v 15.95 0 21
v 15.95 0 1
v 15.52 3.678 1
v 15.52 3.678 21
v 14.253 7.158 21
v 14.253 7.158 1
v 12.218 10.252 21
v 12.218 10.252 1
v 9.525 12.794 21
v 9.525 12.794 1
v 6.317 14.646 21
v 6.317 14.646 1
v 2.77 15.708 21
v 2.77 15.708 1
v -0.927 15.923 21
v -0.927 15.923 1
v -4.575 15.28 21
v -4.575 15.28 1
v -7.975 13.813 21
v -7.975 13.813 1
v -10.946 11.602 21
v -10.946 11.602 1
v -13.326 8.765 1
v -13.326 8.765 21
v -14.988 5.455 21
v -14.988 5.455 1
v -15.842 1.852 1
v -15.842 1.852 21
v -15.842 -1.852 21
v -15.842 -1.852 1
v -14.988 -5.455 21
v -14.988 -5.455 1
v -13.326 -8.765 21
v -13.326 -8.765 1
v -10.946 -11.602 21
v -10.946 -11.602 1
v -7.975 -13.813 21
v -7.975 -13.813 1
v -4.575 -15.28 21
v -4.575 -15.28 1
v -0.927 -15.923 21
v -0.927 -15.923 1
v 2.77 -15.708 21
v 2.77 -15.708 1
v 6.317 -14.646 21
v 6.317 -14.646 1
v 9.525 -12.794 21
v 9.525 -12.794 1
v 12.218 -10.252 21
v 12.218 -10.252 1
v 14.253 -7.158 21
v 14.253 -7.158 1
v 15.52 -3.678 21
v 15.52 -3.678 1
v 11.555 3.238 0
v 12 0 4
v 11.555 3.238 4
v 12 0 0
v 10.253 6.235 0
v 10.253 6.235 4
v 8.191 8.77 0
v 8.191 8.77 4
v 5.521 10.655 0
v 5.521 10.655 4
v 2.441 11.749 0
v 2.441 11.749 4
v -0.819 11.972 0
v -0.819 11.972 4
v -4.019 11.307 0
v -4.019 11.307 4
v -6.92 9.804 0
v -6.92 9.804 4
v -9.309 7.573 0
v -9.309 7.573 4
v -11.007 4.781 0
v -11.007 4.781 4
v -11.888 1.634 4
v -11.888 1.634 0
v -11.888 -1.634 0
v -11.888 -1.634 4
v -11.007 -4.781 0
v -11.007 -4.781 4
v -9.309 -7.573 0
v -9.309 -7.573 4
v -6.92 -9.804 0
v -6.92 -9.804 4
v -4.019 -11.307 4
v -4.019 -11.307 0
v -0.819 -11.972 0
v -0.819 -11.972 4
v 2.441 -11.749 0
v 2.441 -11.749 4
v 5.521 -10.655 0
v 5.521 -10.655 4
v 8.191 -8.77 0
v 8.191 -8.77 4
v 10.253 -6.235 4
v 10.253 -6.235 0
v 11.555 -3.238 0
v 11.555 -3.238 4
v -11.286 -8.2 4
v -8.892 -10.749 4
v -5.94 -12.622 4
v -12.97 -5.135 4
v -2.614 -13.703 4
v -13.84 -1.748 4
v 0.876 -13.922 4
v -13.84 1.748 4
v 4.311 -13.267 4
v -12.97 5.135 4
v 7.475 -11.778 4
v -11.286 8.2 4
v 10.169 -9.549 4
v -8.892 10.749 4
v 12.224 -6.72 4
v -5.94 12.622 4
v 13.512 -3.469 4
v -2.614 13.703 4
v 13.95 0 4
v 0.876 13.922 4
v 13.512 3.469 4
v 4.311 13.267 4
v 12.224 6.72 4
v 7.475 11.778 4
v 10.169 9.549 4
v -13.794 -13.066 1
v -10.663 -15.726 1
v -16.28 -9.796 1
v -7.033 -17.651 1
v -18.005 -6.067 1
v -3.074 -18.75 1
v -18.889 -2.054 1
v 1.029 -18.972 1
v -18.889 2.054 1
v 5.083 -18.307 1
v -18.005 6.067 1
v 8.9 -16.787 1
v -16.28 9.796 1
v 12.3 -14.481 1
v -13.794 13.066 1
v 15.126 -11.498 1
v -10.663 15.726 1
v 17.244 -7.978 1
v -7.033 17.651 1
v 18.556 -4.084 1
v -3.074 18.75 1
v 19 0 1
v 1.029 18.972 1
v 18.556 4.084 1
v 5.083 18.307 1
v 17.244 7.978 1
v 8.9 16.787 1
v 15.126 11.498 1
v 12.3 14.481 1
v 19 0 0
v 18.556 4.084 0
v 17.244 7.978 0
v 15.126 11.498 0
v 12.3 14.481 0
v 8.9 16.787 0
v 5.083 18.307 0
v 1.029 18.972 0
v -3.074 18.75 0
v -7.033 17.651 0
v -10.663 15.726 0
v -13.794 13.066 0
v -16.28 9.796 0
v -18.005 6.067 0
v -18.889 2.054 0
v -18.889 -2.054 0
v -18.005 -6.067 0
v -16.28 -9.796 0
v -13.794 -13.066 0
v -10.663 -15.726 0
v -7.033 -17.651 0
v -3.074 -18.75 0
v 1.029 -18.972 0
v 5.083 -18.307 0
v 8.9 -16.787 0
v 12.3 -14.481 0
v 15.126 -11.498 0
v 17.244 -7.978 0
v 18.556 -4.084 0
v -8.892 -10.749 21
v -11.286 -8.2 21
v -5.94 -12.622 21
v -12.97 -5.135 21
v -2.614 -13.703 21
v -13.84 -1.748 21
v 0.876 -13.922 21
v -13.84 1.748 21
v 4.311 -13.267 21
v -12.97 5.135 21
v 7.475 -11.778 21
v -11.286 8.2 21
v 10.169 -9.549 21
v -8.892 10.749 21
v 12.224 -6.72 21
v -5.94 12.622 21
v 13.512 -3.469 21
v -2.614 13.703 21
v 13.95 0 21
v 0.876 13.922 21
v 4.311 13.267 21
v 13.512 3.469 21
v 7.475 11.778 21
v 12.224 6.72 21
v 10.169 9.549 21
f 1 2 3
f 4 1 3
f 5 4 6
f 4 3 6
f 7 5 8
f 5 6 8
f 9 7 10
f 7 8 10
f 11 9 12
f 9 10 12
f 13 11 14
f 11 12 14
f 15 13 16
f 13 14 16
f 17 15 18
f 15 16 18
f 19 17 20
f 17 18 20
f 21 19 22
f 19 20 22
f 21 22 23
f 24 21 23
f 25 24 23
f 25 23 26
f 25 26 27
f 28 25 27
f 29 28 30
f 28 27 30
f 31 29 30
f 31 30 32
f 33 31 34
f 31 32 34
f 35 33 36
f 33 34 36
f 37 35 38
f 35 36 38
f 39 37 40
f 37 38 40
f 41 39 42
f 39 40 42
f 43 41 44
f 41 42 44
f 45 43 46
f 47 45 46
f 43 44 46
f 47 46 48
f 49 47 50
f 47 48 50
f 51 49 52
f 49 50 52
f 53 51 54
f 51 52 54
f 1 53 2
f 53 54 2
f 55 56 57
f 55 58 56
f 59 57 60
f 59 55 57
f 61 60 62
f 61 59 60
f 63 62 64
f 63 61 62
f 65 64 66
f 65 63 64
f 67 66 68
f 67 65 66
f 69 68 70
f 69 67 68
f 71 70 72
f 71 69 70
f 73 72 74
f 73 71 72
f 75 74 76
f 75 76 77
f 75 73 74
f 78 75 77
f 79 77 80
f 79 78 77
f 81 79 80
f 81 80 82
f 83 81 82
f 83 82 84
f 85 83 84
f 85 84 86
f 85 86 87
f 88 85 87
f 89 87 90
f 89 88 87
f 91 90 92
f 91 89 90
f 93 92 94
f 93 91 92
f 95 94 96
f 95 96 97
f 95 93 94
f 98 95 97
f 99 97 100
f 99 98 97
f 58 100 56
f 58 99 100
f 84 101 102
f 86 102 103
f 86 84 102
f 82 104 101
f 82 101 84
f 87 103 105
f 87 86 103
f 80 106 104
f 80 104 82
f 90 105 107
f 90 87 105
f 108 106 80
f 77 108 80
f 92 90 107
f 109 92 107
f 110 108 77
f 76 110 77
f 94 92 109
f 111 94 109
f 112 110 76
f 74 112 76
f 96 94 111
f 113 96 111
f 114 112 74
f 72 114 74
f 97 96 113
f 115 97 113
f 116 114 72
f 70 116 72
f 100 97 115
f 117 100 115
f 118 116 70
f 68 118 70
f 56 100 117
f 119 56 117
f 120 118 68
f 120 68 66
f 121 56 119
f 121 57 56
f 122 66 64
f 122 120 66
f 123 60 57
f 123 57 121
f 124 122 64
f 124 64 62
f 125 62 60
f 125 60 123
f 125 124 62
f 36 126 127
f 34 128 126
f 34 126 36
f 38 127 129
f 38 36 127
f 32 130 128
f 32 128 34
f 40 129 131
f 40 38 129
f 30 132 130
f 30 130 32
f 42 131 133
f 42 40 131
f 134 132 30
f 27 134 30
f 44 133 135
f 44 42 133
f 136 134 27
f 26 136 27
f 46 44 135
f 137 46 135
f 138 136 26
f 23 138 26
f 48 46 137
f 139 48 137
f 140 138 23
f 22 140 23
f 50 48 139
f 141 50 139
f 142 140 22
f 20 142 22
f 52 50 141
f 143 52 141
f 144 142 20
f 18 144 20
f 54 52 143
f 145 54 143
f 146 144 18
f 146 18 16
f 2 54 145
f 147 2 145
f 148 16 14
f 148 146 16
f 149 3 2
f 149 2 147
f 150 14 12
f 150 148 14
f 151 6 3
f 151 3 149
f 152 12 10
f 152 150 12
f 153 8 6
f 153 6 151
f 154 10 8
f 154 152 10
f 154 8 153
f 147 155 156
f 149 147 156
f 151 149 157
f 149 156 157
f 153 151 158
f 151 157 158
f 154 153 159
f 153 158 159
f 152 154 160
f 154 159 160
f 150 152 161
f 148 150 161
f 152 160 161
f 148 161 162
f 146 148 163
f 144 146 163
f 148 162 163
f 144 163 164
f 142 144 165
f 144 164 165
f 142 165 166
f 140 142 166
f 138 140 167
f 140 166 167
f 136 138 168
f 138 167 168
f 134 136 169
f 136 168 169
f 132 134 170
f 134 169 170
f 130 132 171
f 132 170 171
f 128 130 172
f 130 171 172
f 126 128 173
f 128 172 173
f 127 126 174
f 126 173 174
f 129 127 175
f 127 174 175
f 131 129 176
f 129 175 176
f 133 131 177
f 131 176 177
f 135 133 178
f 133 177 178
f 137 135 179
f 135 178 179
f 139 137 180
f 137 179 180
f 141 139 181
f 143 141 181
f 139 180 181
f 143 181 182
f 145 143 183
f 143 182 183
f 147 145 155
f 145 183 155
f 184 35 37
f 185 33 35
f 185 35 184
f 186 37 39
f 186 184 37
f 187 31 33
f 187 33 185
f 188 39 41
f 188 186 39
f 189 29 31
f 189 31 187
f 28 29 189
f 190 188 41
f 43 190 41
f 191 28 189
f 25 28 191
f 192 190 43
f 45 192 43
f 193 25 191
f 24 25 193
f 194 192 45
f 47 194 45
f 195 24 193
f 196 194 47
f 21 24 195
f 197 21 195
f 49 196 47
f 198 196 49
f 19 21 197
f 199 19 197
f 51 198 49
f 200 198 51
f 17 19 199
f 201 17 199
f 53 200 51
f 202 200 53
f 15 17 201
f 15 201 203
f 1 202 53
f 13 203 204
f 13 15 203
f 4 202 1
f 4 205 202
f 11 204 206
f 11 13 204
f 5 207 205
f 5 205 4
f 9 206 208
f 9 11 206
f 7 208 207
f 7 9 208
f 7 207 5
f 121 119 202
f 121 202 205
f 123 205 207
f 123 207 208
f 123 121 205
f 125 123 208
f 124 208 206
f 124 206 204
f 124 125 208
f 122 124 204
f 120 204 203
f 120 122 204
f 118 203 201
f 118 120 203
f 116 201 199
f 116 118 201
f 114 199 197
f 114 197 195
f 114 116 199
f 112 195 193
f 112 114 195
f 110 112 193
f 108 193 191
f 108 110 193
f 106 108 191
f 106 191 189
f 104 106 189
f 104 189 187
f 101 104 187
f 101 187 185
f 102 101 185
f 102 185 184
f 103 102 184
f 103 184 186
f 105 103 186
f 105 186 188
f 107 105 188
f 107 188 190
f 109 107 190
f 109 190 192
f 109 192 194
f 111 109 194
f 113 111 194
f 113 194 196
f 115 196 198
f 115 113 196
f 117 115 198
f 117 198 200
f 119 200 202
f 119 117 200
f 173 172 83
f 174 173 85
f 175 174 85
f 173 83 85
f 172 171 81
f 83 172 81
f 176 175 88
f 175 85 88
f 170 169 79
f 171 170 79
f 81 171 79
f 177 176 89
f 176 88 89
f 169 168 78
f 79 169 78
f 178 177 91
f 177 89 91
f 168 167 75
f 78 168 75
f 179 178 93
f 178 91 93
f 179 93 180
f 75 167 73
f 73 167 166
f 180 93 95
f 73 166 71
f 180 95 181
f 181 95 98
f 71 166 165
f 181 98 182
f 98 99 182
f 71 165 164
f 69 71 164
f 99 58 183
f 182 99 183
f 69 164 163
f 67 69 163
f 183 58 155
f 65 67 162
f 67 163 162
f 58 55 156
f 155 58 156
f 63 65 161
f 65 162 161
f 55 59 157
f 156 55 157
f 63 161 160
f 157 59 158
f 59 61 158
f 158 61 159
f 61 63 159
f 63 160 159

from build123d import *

# Parameters (mm, degrees)
SKETCH_R      = 19
SKETCH_R_2    = 12
PAD_DEPTH     = 1
SKETCH001_R   = 15.95
SKETCH001_R_2 = 13.95
PAD001_DEPTH  = 20
SKETCH002_R   = 13.95
SKETCH002_R_2 = 12
PAD002_DEPTH  = 3


with BuildPart() as part:
    # Sketch → Pad (new body)
    with BuildSketch(Plane.XY):
        Circle(SKETCH_R)
        Circle(SKETCH_R_2, mode=Mode.SUBTRACT)
    extrude(amount=PAD_DEPTH)

    # Sketch001 → Pad001 (new body)
    with BuildSketch(Plane.XY.offset(1)):
        Circle(SKETCH001_R)
        Circle(SKETCH001_R_2, mode=Mode.SUBTRACT)
    extrude(amount=PAD001_DEPTH)

    # Sketch002 → Pad002 (new body)
    with BuildSketch(Plane.XY.offset(1)):
        Circle(SKETCH002_R)
        Circle(SKETCH002_R_2, mode=Mode.SUBTRACT)
    extrude(amount=PAD002_DEPTH)


solid = part.part
